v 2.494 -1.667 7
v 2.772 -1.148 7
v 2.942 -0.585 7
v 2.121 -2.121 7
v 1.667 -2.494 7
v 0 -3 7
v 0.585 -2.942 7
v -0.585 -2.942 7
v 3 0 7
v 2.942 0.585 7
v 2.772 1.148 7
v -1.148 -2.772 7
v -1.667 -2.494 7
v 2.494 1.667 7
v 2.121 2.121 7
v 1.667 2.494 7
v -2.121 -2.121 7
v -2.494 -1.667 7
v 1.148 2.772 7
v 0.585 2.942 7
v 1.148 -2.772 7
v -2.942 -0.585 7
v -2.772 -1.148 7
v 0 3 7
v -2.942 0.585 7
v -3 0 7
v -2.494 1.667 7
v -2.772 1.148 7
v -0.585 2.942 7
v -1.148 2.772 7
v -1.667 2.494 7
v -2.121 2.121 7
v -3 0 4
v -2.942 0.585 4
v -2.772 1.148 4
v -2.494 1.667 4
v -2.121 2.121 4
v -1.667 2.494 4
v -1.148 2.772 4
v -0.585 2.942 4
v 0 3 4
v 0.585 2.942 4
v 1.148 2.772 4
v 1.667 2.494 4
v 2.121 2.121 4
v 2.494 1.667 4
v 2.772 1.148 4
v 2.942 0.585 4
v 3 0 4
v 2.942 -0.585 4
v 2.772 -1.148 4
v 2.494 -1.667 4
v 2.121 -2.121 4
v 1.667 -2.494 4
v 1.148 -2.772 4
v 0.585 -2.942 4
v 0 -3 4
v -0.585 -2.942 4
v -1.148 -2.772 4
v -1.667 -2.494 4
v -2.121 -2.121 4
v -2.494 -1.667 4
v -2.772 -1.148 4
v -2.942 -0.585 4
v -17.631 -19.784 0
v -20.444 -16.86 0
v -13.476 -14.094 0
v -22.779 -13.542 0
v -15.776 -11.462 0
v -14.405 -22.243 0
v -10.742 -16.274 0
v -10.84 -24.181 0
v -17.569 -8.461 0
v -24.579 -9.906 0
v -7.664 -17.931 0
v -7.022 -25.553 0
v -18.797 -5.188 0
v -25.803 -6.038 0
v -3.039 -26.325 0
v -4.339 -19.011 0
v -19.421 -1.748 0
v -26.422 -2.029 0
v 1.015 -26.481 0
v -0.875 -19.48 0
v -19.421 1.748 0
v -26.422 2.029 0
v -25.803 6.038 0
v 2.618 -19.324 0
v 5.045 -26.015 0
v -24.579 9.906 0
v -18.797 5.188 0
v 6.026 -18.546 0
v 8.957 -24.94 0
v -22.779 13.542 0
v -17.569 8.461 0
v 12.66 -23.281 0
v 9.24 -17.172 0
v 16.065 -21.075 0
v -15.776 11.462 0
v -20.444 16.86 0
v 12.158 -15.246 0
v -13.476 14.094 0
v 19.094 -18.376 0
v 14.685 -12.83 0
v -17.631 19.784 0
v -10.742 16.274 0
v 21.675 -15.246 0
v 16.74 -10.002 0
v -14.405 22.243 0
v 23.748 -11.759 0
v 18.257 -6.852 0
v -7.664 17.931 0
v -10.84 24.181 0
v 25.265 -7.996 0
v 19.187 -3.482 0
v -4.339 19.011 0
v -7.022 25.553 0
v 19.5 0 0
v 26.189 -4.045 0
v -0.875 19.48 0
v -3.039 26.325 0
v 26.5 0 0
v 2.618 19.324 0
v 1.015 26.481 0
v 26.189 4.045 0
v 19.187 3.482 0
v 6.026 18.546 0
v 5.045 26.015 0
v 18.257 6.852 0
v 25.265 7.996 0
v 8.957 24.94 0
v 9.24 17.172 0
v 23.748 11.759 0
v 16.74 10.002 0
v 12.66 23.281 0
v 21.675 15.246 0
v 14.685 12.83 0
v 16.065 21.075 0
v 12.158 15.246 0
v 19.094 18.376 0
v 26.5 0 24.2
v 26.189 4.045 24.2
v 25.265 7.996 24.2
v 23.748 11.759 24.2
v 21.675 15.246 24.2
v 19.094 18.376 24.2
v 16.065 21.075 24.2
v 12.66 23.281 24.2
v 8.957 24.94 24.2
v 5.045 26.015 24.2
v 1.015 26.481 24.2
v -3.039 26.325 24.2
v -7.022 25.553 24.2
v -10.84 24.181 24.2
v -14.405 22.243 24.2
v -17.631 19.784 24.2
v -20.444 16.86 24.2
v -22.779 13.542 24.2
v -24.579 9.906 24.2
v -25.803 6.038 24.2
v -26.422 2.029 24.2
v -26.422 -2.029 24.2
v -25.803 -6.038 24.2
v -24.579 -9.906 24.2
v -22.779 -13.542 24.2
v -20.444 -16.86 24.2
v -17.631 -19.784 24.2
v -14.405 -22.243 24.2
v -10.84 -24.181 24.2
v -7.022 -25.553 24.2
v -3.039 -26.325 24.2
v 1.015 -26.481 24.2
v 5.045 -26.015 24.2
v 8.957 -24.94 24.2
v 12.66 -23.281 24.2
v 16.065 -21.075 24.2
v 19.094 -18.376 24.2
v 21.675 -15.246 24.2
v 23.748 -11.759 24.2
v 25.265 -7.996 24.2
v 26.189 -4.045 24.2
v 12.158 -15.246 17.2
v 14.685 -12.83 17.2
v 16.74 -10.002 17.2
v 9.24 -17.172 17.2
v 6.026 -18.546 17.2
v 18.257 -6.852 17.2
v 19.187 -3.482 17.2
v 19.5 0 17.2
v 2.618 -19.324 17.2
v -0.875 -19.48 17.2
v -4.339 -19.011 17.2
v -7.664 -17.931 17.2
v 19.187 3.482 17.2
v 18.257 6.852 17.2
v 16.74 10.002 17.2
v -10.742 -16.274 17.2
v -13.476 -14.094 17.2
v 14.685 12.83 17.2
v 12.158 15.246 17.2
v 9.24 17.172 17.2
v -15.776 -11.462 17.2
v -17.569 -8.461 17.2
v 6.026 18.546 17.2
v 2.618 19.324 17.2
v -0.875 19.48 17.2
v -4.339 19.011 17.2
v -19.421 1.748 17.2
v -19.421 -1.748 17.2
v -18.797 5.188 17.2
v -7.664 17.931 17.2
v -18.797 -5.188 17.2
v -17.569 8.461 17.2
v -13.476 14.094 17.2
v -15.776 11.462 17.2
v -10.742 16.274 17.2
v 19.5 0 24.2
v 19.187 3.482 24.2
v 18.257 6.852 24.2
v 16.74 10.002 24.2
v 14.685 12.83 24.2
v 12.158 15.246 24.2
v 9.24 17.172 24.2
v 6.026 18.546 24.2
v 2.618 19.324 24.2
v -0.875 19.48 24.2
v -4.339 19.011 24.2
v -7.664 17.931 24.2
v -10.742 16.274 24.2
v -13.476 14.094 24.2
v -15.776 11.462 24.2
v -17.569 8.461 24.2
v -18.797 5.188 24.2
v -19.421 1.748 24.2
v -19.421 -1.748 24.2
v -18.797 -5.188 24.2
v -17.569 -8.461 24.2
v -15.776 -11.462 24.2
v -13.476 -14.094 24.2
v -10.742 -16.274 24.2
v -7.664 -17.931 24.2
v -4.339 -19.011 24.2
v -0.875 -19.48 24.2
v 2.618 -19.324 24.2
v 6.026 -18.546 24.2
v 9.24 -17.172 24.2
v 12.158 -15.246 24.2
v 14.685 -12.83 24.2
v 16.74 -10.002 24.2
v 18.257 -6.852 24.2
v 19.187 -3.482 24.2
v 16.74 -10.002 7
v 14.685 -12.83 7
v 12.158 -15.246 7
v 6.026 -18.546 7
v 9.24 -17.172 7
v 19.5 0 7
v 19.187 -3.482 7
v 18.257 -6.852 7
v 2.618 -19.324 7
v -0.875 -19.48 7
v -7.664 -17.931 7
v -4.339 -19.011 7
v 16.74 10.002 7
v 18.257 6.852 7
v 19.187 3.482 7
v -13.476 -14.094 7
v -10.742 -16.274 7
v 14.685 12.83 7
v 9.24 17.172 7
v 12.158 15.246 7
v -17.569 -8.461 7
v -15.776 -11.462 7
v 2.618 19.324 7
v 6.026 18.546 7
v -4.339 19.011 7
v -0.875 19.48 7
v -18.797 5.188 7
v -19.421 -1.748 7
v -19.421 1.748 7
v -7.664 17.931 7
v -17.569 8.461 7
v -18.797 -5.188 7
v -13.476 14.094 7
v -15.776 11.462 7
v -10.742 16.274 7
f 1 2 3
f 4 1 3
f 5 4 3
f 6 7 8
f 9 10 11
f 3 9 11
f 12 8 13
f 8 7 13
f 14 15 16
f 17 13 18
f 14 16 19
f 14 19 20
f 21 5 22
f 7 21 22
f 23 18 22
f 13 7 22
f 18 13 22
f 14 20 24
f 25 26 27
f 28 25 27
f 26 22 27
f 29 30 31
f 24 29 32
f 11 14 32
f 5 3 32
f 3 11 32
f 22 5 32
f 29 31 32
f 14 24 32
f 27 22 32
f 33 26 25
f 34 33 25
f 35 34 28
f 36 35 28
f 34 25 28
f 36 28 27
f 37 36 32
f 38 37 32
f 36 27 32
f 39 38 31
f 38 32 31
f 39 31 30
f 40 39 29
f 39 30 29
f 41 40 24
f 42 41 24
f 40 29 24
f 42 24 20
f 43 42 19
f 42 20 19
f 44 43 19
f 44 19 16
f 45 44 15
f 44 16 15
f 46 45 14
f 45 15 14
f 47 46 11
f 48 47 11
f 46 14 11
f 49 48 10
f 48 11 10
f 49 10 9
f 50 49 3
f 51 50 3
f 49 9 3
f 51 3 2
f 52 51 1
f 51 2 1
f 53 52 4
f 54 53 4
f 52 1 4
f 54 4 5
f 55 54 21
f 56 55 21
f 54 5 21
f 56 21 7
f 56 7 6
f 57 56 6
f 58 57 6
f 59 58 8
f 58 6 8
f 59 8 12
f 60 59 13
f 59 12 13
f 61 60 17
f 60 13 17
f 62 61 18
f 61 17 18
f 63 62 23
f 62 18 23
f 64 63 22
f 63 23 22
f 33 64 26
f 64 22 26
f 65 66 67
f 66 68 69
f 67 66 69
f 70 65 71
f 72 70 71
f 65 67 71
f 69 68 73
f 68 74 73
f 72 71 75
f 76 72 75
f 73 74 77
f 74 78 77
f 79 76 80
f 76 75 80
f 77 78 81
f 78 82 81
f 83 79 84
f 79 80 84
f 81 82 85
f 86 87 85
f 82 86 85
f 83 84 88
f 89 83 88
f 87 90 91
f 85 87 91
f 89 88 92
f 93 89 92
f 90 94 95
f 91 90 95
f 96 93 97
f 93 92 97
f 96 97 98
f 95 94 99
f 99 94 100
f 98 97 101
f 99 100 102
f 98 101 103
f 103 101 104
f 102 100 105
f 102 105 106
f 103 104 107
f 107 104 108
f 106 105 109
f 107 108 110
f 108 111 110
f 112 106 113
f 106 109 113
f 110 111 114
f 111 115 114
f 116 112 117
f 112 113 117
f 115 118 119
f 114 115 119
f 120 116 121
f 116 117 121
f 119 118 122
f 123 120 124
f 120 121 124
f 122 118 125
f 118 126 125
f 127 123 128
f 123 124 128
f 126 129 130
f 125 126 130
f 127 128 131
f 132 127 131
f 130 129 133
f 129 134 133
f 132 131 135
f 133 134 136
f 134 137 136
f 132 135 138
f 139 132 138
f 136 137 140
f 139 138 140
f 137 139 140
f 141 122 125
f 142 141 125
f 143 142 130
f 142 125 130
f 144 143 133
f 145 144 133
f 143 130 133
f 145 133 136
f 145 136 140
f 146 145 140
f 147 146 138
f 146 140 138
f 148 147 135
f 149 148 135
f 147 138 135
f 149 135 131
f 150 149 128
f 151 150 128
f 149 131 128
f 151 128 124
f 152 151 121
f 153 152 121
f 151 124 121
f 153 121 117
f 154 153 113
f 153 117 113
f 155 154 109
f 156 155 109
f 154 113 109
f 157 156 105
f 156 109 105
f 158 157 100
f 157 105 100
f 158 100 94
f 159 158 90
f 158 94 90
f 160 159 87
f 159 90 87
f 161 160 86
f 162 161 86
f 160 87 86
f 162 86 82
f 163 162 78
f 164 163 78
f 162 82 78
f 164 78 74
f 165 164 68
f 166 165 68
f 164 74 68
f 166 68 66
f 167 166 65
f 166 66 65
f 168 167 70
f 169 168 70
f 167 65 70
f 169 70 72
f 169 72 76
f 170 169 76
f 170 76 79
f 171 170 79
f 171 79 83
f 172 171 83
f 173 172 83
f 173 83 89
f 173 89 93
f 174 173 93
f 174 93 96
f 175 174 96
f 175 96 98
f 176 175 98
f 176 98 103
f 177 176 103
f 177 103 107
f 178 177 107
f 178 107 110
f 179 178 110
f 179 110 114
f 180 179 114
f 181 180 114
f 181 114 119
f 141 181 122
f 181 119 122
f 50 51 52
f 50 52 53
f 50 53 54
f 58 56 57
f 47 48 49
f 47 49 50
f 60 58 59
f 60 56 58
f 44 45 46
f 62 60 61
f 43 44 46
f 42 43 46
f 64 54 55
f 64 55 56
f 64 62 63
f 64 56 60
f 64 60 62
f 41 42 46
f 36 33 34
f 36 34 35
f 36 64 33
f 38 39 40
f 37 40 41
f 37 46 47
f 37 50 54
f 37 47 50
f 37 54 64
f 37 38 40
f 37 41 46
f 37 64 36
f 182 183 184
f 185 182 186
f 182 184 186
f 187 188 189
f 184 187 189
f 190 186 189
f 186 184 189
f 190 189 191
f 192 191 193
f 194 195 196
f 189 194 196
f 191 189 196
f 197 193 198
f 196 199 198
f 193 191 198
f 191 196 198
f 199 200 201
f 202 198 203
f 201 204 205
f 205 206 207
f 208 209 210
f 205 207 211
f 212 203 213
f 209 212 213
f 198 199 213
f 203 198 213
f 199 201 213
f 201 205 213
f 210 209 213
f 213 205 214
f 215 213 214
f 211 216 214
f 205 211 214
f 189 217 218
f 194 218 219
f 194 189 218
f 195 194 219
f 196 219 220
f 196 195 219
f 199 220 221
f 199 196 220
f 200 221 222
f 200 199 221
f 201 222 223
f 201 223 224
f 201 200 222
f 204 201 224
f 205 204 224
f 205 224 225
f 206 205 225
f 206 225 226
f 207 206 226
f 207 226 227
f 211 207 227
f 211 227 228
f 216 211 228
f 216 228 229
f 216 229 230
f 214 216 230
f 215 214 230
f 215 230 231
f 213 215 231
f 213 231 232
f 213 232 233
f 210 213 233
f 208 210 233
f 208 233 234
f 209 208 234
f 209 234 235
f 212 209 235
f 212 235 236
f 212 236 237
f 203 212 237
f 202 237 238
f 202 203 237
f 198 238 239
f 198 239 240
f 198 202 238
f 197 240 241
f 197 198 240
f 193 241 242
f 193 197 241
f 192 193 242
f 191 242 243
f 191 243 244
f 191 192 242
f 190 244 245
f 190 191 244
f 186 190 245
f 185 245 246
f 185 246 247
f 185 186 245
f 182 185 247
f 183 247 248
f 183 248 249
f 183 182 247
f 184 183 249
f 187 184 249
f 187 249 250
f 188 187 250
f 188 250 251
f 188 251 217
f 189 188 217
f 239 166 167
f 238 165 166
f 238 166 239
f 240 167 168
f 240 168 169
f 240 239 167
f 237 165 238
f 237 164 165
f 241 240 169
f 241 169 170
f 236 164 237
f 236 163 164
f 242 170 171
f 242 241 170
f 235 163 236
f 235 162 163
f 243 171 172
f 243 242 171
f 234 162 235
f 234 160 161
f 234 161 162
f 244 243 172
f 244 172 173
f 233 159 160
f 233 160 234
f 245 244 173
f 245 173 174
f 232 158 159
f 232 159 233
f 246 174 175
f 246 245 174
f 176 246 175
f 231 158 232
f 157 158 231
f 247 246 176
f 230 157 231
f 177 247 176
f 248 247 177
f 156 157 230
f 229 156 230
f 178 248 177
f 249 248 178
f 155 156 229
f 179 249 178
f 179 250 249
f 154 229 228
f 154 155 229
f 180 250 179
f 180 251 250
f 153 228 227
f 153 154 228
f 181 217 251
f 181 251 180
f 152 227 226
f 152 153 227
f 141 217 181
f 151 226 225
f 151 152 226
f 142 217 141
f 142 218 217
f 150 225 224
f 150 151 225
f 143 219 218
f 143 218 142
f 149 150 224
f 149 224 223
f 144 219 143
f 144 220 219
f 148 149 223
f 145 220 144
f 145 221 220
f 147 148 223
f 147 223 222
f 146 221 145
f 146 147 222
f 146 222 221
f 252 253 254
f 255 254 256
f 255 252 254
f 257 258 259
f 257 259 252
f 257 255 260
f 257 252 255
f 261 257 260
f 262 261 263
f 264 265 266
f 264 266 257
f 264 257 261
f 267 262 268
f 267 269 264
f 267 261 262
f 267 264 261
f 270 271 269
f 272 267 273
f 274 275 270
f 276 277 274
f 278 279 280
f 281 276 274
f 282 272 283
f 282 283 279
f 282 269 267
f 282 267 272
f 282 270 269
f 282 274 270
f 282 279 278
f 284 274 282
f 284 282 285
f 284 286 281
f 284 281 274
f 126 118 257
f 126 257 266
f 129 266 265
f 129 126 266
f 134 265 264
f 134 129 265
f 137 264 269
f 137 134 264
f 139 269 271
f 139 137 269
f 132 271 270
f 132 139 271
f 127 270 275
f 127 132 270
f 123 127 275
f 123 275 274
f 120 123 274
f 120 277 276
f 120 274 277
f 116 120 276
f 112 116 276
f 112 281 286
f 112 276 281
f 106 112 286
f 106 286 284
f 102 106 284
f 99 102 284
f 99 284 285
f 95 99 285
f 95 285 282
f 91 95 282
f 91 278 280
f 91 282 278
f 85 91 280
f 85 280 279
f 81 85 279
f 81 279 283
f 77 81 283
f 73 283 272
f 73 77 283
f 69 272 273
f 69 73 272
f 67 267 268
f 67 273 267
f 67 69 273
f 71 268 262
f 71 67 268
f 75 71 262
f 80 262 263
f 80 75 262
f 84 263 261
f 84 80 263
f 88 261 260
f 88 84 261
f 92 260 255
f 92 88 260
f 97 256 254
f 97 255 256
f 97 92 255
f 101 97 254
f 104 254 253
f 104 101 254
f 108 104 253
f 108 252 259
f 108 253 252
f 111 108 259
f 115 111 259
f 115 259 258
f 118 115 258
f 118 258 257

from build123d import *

# Parameters (mm, degrees)
SKETCH_1_R      = 26.5
SKETCH_1_R_2    = 19.5
EXTRUDE_1_DEPTH = 24.2
EXTRUDE_START   = -7
SKETCH_2_R      = 19.5
EXTRUDE_7_DEPTH = 10.2
SKETCH_4_R      = 3
EXTRUDE_8_DEPTH = 3


with BuildPart() as part:
    # ｽｹｯﾁ1 → ﾎﾞｽ - 押し出し1 (new body)
    with BuildSketch(Plane.XY):
        Circle(SKETCH_1_R)
        Circle(SKETCH_1_R_2, mode=Mode.SUBTRACT)
    extrude(amount=EXTRUDE_1_DEPTH)

    # ｽｹｯﾁ2 → ﾎﾞｽ - 押し出し7 (add)
    with BuildSketch(Plane(origin=(0, 0, 0), x_dir=(-1, 0, 0), z_dir=(0, 0, -1)).offset(EXTRUDE_START)):
        Circle(SKETCH_2_R)
    extrude(amount=-EXTRUDE_7_DEPTH)


with BuildPart() as body_2:
    # ｽｹｯﾁ4 → ﾎﾞｽ - 押し出し8 (new body)
    with BuildSketch(Plane(origin=(0, 0, 0), x_dir=(-1, 0, 0), z_dir=(0, 0, -1)).offset(EXTRUDE_START)):
        Circle(SKETCH_4_R)
    extrude(amount=EXTRUDE_8_DEPTH)


solid = Compound([part.part, body_2.part])
